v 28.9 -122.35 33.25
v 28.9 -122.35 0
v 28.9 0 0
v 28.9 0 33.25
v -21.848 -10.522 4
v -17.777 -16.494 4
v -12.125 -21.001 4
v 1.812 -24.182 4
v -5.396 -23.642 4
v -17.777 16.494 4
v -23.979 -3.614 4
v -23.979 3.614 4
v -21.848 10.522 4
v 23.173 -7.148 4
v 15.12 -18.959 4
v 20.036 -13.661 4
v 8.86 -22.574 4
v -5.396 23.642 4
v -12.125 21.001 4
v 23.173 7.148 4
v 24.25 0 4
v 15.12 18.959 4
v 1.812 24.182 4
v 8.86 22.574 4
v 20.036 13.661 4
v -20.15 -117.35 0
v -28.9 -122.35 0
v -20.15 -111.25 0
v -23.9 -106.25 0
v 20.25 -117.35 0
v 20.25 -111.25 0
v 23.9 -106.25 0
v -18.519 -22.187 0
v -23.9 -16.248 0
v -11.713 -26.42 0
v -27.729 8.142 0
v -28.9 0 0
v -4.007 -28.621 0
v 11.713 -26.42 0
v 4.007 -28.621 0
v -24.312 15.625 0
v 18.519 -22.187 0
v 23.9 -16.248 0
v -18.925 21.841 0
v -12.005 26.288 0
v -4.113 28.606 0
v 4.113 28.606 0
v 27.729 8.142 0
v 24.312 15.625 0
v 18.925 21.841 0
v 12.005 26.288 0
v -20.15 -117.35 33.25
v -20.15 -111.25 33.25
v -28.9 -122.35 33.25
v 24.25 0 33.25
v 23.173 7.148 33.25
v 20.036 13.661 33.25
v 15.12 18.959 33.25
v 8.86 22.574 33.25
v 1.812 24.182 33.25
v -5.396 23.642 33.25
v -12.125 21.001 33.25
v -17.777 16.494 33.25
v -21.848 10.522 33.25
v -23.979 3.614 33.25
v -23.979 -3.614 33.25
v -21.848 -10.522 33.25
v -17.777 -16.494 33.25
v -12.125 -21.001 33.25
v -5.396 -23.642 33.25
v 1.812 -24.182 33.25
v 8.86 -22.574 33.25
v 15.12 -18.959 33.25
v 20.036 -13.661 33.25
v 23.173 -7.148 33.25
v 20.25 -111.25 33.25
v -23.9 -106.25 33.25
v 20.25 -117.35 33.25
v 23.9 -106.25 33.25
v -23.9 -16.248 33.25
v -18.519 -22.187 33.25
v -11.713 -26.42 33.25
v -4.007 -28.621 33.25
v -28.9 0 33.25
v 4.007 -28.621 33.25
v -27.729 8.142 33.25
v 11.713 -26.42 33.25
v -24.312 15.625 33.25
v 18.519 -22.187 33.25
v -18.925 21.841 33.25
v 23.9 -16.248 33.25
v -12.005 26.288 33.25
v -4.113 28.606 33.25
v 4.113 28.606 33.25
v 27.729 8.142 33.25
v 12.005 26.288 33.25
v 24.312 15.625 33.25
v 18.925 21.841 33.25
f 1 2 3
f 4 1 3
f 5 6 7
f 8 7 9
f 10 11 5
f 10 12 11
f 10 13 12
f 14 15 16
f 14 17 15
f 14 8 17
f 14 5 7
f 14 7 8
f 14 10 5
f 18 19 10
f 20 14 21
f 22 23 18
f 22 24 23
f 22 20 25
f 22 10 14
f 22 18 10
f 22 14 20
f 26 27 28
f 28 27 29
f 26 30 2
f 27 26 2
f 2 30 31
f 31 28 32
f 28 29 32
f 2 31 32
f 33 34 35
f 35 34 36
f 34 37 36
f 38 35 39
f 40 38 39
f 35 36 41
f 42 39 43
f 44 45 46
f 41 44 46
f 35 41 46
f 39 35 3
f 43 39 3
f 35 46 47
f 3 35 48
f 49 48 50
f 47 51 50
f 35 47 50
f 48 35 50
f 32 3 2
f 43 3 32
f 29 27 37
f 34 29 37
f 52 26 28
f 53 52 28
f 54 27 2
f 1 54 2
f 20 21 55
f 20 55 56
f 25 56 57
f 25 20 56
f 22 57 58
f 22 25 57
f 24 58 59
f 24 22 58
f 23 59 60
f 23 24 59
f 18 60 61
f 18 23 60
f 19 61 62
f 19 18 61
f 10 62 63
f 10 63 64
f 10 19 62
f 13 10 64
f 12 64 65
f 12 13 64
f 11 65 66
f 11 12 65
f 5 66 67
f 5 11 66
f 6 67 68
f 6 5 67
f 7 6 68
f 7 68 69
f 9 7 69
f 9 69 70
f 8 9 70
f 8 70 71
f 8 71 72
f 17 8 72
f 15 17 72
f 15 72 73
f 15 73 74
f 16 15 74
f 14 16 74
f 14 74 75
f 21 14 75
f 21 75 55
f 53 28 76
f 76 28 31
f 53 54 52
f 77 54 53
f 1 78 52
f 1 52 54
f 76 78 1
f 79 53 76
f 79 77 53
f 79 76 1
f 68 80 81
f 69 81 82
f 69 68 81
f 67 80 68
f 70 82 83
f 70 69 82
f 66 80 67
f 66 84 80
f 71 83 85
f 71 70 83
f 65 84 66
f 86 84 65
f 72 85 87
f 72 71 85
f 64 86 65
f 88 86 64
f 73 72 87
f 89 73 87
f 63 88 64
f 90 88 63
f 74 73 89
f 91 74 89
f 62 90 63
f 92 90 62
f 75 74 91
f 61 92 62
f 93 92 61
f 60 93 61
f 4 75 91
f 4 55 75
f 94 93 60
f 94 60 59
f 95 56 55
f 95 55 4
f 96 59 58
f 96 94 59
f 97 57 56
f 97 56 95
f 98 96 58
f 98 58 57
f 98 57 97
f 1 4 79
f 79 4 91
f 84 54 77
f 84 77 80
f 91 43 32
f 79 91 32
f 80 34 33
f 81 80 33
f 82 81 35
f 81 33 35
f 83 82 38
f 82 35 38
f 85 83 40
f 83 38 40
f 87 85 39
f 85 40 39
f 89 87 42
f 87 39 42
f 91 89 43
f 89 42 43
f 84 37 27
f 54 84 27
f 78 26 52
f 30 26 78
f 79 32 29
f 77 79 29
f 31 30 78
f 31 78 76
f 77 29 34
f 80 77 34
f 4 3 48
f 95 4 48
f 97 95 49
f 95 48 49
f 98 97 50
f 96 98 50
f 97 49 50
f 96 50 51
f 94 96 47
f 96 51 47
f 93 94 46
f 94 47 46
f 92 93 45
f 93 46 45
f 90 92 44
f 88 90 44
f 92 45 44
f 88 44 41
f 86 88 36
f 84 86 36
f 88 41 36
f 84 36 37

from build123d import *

# Parameters (mm, degrees)
F0_R     = 28.9
F0_R_2   = 24.25
F1_DEPTH = 33.25
F2_R     = 28.9
F3_DEPTH = 4
F4_W     = 40.4
F4_H     = 6.1
F5_DEPTH = 33.25


with BuildPart() as f1:
    # F0 (on Top) → F1 (new body)
    with BuildSketch(Plane.XY):
        Circle(F0_R)
        Circle(F0_R_2, mode=Mode.SUBTRACT)
    extrude(amount=F1_DEPTH)

    # F2 (on Top) → F3 (join)
    with BuildSketch(Plane.XY):
        Circle(F2_R)
    extrude(amount=F3_DEPTH)

    # F4 (on Top) → F5 (join, through all)
    with BuildSketch(Plane.XY):
        with BuildLine():
            Line((28.9, -73.001511), (28.9, 0))
            ThreePointArc((28.9, 0), (27.621731, -8.5), (23.9, -16.248077))
            Line((23.9, -16.248077), (23.9, -66.324389))
            Line((23.9, -66.324389), (23.9, -106.25))
            Line((23.9, -106.25), (-23.9, -106.25))
            Line((-23.9, -106.25), (-23.9, -66.324378))
            Line((-23.9, -66.324378), (-23.9, -16.248077))
            ThreePointArc((-23.9, -16.248077), (-27.621731, -8.5), (-28.9, 0))
            Line((-28.9, 0), (-28.9, -73.001511))
            Line((-28.9, -73.001511), (-28.9, -88.678621))
            Line((-28.9, -88.678621), (-28.9, -122.35))
            Line((-28.9, -122.35), (28.9, -122.35))
            Line((28.9, -122.35), (28.9, -88.678621))
            Line((28.9, -88.678621), (28.9, -73.001511))
        make_face()
        with Locations((0.05, -114.3)):
            Rectangle(F4_W, F4_H, mode=Mode.SUBTRACT)
    extrude(amount=F5_DEPTH)


solid = f1.part
